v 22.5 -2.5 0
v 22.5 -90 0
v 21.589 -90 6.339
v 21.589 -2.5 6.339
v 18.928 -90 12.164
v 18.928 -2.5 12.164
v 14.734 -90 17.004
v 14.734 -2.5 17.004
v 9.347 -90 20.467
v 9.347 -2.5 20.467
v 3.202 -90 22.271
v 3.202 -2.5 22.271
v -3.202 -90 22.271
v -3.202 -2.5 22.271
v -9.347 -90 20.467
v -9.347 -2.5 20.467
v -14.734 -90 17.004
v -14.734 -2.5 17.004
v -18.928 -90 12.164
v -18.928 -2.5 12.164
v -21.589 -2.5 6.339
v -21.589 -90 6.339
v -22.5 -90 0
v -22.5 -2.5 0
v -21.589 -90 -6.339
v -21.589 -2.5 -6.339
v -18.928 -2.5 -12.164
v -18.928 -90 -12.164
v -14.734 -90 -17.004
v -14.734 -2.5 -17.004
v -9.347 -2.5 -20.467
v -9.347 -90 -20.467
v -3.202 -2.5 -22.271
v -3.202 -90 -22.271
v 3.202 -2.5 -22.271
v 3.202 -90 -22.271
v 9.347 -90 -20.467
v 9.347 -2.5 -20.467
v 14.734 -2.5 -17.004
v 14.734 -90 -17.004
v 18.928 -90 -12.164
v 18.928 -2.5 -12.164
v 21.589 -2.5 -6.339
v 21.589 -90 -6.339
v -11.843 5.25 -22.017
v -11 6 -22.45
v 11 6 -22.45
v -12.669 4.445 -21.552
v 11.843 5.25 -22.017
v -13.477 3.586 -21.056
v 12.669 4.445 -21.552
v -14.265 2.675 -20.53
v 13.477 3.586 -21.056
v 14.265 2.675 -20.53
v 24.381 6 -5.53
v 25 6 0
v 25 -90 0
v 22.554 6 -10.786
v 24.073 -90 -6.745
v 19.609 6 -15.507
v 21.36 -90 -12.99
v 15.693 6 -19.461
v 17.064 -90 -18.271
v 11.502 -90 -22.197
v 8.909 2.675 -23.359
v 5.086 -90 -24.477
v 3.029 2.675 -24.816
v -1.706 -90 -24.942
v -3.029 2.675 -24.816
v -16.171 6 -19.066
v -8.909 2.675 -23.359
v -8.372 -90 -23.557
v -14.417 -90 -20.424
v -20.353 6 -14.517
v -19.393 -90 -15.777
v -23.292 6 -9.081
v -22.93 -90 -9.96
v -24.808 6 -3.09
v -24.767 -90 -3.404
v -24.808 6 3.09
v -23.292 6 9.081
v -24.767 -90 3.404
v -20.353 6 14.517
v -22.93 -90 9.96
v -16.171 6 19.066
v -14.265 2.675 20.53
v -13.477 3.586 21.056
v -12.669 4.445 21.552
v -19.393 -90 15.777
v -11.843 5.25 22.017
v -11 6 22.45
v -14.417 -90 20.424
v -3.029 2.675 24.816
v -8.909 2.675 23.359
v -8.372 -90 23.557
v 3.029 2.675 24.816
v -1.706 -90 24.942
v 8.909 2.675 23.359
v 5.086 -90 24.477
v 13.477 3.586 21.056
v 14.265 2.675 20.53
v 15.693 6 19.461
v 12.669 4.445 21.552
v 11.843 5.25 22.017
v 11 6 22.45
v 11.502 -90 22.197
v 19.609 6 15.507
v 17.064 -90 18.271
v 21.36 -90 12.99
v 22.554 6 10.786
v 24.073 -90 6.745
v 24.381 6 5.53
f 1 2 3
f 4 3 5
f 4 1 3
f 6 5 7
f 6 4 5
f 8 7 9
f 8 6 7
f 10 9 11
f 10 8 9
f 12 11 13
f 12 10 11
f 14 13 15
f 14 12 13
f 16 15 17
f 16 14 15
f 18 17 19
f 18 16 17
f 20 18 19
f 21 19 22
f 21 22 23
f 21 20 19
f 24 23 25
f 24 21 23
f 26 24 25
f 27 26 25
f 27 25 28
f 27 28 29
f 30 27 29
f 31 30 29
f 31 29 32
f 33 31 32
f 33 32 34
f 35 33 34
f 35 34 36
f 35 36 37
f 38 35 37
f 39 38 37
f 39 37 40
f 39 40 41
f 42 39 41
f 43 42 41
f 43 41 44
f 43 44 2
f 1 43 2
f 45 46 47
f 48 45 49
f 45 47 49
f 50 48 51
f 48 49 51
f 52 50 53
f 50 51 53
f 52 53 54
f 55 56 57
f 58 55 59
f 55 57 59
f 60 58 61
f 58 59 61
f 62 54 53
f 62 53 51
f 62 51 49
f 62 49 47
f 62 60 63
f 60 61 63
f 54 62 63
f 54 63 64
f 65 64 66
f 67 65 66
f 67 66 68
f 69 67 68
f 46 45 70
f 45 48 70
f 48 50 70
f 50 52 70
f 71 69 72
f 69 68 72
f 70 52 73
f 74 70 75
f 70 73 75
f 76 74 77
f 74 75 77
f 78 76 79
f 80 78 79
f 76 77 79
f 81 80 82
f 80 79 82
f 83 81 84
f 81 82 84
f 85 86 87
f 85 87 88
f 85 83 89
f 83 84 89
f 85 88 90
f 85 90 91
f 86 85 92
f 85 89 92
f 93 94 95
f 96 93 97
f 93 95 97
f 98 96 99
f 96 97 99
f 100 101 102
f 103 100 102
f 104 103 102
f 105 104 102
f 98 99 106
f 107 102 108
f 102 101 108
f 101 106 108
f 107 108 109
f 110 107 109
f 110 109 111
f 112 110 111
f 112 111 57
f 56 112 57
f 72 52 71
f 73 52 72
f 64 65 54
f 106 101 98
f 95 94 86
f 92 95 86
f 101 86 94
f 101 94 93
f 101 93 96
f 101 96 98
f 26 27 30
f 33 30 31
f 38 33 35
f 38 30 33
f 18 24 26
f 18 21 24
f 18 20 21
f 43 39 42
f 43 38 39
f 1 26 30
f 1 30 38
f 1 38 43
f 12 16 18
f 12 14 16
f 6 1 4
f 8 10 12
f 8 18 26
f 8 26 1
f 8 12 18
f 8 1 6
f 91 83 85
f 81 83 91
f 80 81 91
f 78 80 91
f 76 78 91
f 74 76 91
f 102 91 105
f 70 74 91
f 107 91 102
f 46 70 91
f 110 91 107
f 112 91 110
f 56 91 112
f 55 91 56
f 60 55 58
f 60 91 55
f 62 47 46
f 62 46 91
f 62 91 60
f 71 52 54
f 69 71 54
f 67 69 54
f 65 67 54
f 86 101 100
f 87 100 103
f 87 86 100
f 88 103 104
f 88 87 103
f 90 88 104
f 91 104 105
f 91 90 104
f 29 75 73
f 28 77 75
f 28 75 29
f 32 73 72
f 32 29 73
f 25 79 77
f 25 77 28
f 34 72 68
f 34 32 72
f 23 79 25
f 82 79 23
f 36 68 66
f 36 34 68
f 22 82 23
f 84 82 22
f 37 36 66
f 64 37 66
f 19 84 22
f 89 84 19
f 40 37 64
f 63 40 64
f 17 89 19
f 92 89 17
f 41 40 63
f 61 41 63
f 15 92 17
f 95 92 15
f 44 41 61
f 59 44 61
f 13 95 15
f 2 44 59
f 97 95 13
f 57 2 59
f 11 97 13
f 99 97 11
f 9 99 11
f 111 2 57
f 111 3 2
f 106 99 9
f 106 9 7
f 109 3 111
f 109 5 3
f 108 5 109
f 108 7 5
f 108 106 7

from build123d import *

# Parameters (mm, degrees)
F0_R      = 25
F1_DEPTH  = 90
F2_T      = -2.5
F1_FACE_R = 25
F3_DEPTH  = 6
F5_DEPTH  = 50


with BuildPart() as f1:
    # F0 (on Front) → F1 (new body)
    with BuildSketch(Plane.XZ):
        Circle(F0_R)
    extrude(amount=F1_DEPTH)

    # F2
    f2_openings = [f1.faces().sort_by_distance(p)[0] for p in [
        (0, -90, 0),
    ]]
    offset(amount=F2_T, openings=f2_openings)

    # F1_face (on face) → F3 (join)
    with BuildSketch(Plane(origin=(0, 0, 0), x_dir=(1, 0, 0), z_dir=(0, 1, 0))):
        Circle(F1_FACE_R)
    extrude(amount=F3_DEPTH)

    # F4 (on Right) → F5 (cut, symmetric)
    with BuildSketch(Plane.YZ):
        Polygon((2.675209, 35.80374), (2.675209, 20.530431), (6, 22.45), (6, 35.80374), align=None)
        Polygon((6, -37.240567), (6, -22.45), (2.675209, -20.530431), (2.675209, -37.240567), align=None)
    extrude(amount=F5_DEPTH, both=True, mode=Mode.SUBTRACT)


solid = f1.part
